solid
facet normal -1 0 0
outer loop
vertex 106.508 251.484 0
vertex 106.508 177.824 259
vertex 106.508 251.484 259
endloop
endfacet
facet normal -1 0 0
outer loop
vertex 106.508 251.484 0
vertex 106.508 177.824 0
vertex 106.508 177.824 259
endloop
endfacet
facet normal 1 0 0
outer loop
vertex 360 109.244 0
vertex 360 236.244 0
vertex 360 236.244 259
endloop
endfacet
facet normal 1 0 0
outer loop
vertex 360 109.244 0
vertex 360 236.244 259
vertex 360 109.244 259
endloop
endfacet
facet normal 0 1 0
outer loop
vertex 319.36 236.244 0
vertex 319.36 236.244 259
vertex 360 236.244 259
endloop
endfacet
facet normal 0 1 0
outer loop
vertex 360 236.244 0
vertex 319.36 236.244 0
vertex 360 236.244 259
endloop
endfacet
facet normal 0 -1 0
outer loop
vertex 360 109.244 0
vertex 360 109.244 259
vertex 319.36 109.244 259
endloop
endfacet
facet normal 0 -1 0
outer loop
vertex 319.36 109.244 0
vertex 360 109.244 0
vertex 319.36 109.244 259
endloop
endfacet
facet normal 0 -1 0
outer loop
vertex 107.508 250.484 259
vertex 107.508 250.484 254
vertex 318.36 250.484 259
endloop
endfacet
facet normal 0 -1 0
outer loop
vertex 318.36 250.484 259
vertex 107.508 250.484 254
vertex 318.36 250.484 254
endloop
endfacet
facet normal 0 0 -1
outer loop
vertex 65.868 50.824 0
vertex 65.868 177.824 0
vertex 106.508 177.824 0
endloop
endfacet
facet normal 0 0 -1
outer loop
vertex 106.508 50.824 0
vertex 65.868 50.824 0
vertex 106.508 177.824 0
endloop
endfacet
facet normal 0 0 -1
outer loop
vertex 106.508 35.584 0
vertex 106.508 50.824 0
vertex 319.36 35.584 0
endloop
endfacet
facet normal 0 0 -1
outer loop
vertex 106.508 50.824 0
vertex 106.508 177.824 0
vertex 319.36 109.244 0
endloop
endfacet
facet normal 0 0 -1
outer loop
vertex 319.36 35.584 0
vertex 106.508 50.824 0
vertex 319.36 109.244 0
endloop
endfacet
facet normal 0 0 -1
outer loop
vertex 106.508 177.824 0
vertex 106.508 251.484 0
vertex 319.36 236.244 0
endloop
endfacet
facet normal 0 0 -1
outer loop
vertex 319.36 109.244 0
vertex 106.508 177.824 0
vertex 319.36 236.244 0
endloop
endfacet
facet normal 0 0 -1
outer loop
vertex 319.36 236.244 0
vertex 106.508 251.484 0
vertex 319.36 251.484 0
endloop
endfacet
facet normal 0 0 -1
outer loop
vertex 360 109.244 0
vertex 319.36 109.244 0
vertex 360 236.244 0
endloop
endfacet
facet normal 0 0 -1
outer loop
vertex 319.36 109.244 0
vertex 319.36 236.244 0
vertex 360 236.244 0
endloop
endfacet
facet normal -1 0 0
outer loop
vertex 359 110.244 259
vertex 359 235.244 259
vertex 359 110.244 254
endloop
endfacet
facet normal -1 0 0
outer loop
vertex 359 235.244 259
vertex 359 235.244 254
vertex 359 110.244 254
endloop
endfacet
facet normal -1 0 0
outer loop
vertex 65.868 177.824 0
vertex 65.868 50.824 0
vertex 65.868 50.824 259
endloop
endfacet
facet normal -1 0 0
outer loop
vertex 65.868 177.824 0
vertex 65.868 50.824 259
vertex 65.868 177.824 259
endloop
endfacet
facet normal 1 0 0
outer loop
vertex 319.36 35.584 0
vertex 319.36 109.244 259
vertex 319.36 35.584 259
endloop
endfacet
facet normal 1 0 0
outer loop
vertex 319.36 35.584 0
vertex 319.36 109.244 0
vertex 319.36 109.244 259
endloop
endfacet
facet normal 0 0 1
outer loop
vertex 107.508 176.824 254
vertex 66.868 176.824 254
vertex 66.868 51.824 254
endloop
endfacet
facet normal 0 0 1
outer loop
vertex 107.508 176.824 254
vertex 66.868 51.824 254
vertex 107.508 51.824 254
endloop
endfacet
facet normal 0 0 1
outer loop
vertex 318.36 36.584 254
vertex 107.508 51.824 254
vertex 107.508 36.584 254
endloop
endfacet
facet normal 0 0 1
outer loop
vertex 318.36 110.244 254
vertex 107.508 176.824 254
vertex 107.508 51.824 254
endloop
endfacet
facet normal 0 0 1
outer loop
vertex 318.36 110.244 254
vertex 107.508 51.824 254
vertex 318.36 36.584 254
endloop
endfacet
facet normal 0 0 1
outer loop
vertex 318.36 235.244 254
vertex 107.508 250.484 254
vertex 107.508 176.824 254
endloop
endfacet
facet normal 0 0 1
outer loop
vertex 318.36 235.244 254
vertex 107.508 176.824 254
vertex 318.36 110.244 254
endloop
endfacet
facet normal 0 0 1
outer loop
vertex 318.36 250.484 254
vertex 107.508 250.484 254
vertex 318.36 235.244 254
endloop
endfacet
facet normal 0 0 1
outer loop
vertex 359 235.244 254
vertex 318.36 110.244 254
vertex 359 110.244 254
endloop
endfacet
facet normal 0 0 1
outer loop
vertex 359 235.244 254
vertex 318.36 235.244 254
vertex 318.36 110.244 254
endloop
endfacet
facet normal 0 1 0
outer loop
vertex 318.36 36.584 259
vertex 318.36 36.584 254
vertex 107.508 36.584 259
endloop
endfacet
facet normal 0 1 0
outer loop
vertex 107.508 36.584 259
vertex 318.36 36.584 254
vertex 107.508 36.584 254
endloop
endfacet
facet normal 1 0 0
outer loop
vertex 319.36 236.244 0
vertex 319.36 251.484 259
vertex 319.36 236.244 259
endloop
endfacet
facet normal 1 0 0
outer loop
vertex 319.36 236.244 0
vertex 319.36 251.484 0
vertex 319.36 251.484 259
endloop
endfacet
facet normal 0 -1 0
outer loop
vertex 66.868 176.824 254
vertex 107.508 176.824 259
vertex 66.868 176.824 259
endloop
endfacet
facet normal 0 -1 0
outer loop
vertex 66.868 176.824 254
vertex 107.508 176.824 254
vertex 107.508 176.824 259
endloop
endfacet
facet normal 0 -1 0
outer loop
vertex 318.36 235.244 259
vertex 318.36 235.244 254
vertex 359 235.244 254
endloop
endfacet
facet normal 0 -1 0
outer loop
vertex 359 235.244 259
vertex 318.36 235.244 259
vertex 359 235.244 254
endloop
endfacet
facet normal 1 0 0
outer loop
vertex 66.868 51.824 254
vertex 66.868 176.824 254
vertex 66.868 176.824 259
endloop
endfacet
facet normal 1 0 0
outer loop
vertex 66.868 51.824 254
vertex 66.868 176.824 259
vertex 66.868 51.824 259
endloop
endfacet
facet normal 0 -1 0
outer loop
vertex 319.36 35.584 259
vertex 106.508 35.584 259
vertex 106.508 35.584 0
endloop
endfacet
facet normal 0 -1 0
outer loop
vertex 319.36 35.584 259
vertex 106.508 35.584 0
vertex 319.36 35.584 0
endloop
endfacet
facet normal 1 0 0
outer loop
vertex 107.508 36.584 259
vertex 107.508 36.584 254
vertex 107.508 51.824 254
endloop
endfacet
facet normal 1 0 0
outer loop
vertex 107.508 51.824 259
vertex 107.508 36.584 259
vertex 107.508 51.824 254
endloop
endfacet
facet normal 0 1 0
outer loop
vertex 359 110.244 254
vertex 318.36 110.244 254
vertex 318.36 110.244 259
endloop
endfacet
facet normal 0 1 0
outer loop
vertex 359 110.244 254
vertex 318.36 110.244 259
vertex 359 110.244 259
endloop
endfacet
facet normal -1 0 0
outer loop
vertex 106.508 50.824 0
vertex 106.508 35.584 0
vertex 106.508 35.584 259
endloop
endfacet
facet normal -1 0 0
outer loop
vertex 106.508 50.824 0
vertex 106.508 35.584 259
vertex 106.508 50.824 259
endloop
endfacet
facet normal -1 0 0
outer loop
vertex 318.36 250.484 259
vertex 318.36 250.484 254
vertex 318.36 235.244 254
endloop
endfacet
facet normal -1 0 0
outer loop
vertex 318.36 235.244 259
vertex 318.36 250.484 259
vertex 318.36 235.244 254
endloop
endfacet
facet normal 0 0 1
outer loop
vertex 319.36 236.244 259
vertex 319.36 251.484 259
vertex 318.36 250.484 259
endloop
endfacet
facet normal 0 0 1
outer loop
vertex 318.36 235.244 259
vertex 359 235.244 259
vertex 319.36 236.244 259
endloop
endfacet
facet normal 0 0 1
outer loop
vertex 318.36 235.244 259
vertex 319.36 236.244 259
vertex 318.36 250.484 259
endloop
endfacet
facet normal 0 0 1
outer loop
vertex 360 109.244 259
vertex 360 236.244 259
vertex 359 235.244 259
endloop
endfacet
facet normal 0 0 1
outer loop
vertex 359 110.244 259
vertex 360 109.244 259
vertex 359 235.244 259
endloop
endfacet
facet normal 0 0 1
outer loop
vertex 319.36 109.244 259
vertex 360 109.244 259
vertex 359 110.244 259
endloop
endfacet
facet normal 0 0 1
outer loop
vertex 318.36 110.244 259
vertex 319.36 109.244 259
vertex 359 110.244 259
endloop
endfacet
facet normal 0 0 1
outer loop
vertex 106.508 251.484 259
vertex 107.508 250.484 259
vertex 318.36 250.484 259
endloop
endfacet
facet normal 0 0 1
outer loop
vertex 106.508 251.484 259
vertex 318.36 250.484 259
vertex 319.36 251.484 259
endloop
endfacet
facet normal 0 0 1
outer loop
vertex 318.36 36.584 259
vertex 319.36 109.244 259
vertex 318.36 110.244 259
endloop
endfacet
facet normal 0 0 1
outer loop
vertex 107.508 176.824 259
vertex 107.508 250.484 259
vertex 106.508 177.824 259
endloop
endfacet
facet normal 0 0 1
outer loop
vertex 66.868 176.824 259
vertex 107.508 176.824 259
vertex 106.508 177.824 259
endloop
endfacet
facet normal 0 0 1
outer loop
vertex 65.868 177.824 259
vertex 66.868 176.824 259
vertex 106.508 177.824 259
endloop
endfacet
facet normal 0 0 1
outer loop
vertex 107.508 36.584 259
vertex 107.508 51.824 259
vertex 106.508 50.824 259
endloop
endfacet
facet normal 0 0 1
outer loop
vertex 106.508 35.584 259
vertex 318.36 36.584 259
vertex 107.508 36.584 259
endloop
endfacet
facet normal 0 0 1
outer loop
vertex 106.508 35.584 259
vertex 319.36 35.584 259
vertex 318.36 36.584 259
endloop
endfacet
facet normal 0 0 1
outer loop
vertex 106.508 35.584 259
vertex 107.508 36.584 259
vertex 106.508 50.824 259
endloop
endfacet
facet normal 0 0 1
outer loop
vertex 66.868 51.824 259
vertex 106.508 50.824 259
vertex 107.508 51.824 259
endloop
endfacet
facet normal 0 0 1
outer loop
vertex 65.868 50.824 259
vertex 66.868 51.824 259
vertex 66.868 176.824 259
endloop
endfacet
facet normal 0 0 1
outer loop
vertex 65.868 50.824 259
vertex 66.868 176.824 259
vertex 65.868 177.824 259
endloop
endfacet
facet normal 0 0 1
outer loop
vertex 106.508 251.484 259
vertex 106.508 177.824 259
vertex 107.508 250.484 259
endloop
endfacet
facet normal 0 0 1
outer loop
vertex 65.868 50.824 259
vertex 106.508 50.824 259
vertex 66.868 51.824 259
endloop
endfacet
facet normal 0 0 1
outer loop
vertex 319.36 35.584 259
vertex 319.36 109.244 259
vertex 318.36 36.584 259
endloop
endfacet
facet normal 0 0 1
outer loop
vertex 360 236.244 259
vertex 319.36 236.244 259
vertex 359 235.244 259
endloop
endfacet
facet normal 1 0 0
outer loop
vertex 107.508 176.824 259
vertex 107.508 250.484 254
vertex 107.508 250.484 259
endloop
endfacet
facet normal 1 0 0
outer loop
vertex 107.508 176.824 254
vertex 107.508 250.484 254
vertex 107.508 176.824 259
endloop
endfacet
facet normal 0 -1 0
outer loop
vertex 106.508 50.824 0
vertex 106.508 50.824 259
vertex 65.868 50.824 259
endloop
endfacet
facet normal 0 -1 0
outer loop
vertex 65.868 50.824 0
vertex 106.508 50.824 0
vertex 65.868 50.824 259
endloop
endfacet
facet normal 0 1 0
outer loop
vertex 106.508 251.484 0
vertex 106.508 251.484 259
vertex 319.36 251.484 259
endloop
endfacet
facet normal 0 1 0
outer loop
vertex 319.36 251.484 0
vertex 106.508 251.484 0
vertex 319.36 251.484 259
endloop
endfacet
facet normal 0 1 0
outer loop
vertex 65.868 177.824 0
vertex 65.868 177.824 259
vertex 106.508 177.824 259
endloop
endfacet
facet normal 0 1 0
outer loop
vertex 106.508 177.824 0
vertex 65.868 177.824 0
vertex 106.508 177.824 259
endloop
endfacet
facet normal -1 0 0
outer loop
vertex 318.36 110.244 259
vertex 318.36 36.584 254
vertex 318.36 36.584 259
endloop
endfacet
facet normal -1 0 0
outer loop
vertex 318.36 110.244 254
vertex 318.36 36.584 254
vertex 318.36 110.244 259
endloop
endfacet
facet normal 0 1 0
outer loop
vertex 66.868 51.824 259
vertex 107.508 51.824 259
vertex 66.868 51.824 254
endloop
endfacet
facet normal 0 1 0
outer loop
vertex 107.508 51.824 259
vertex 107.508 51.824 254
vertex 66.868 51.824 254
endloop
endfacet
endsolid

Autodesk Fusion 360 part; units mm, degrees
sketch "Sketch1" plane through (0, 0, 0) normal (0, 0, 1) x (1, 0, 0)
sketch "Sketch2" plane through (0, 0, 0) normal (0, 0, 1) x (1, 0, 0)
  line L0 (106.508, 35.5843) -> (319.36, 35.5843)
  line L1 (106.508, 35.5843) -> (106.508, 50.8243)
  line L2 (106.508, 50.8243) -> (65.868, 50.8243)
  line L3 (65.868, 50.8243) -> (65.868, 177.8243)
  line L4 (65.868, 177.8243) -> (106.508, 177.8243)
  line L5 (106.508, 177.8243) -> (106.508, 251.4843)
  line L6 (106.508, 251.4843) -> (319.36, 251.4843)
  line L7 (319.36, 251.4843) -> (319.36, 236.2443)
  line L8 (319.36, 236.2443) -> (360, 236.2443)
  line L9 (360, 236.2443) -> (360, 109.2443)
  line L10 (360, 109.2443) -> (319.36, 109.2443)
  line L11 (319.36, 109.2443) -> (319.36, 35.5843)
  dimension "d2" = 212.852
  dimension "d3" = 15.24
  dimension "d4" = 40.64
  dimension "d5" = 127
  dimension "d6" = 40.64
  dimension "d7" = 73.66
  dimension "d8" = 212.852
  dimension "d9" = 15.24
  dimension "d10" = 40.64
  dimension "d11" = 73.66
extrude "Extrude1" add sketch "Sketch2" along normal blind 254
sketch "Sketch3" plane through (0, 0, 254) normal (0, 0, 1) x (-1, 0, 0)
  line L0 (-106.508, -35.5843) -> (-319.36, -35.5843)
  line L1 (-319.36, -35.5843) -> (-319.36, -109.2443)
  line L2 (-319.36, -109.2443) -> (-360, -109.2443)
  line L3 (-360, -109.2443) -> (-360, -236.2443)
  line L4 (-360, -236.2443) -> (-319.36, -236.2443)
  line L5 (-319.36, -236.2443) -> (-319.36, -251.4843)
  line L6 (-319.36, -251.4843) -> (-106.508, -251.4843)
  line L7 (-106.508, -251.4843) -> (-106.508, -177.8243)
  line L8 (-106.508, -177.8243) -> (-65.868, -177.8243)
  line L9 (-65.868, -177.8243) -> (-65.868, -50.8243)
  line L10 (-65.868, -50.8243) -> (-106.508, -50.8243)
  line L11 (-106.508, -50.8243) -> (-106.508, -35.5843)
  line L12 (-65.868, -177.8243) -> (-66.868, -177.8243)
  line L13 (-66.868, -177.8243) -> (-66.868, -50.8243)
  line L14 (-66.868, -50.8243) -> (-65.868, -50.8243)
  line L15 (-65.868, -50.8243) -> (-65.868, -177.8243)
  line L16 (-65.868, -177.8243) -> (-107.508, -177.8243)
  line L17 (-107.508, -177.8243) -> (-107.508, -176.8243)
  line L18 (-107.508, -176.8243) -> (-65.868, -176.8243)
  line L19 (-65.868, -176.8243) -> (-65.868, -177.8243)
  line L20 (-65.868, -50.8243) -> (-107.508, -50.8243)
  line L21 (-107.508, -50.8243) -> (-107.508, -51.8243)
  line L22 (-107.508, -51.8243) -> (-65.868, -51.8243)
  line L23 (-65.868, -51.8243) -> (-65.868, -50.8243)
  line L24 (-107.508, -51.8243) -> (-106.508, -51.8243)
  line L25 (-106.508, -51.8243) -> (-106.508, -35.5843)
  line L26 (-106.508, -35.5843) -> (-107.508, -35.5843)
  line L27 (-107.508, -35.5843) -> (-107.508, -51.8243)
  line L28 (-106.508, -35.5843) -> (-319.36, -35.5843)
  line L29 (-319.36, -35.5843) -> (-319.36, -36.5843)
  line L30 (-319.36, -36.5843) -> (-106.508, -36.5843)
  line L31 (-106.508, -36.5843) -> (-106.508, -35.5843)
  line L32 (-319.36, -35.5843) -> (-318.36, -35.5843)
  line L33 (-318.36, -35.5843) -> (-318.36, -110.2443)
  line L34 (-318.36, -110.2443) -> (-319.36, -110.2443)
  line L35 (-319.36, -110.2443) -> (-319.36, -35.5843)
  line L36 (-318.36, -110.2443) -> (-360, -110.2443)
  line L37 (-360, -110.2443) -> (-360, -109.2443)
  line L38 (-360, -109.2443) -> (-318.36, -109.2443)
  line L39 (-318.36, -109.2443) -> (-318.36, -110.2443)
  line L40 (-360, -236.2443) -> (-359, -236.2443)
  line L41 (-359, -236.2443) -> (-359, -109.2443)
  line L42 (-359, -109.2443) -> (-360, -109.2443)
  line L43 (-360, -109.2443) -> (-360, -236.2443)
  line L44 (-360, -236.2443) -> (-318.36, -236.2443)
  line L45 (-318.36, -236.2443) -> (-318.36, -235.2443)
  line L46 (-318.36, -235.2443) -> (-360, -235.2443)
  line L47 (-360, -235.2443) -> (-360, -236.2443)
  line L48 (-319.36, -251.4843) -> (-318.36, -251.4843)
  line L49 (-318.36, -251.4843) -> (-318.36, -235.2443)
  line L50 (-318.36, -235.2443) -> (-319.36, -235.2443)
  line L51 (-319.36, -235.2443) -> (-319.36, -251.4843)
  line L52 (-319.36, -251.4843) -> (-106.508, -251.4843)
  line L53 (-106.508, -251.4843) -> (-106.508, -250.4843)
  line L54 (-106.508, -250.4843) -> (-319.36, -250.4843)
  line L55 (-319.36, -250.4843) -> (-319.36, -251.4843)
  line L56 (-107.508, -176.8243) -> (-106.508, -176.8243)
  line L57 (-106.508, -176.8243) -> (-106.508, -251.4843)
  line L58 (-106.508, -251.4843) -> (-107.508, -251.4843)
  line L59 (-107.508, -251.4843) -> (-107.508, -176.8243)
  dimension "d14" = 1
  dimension "d15" = 1
  dimension "d16" = 1
  dimension "d17" = 1
  dimension "d18" = 1
  dimension "d19" = 1
  dimension "d20" = 1
  dimension "d21" = 1
  dimension "d22" = 1
  dimension "d23" = 1
  dimension "d24" = 1
  dimension "d25" = 1
extrude "Extrude2" add sketch "Sketch3" along normal blind 5 contours L0 L11 L25 L26 L27 L28 L30 L31 | L0 L27 L28 L30 L33 | L11 L20 L25 L27 L30 | L0 L1 L28 L29 L30 L32 L33 L35 | L20 L21 L22 L24 L25 L27 | L10 L13 L20 L22 L25 | L1 L30 L33 L35 L38 | L9 L10 L13 L14 L15 L20 L22 L23 | L33 L34 L35 L36 L38 L39 | L9 L13 L15 L18 L22 | L2 L35 L36 L38 L41 | L8 L9 L12 L13 L15 L16 L18 L19 | L8 L13 L16 L18 L57 | L2 L3 L36 L37 L38 L41 L42 L43 | L16 L17 L18 L56 L57 L59 | L3 L36 L41 L43 L46 | L7 L16 L54 L57 L59 | L4 L41 L44 L46 L51 | L3 L4 L40 L41 L43 L44 L46 L47 | L6 L7 L52 L53 L54 L57 L58 L59 | L44 L45 L46 L49 L50 L51 | L6 L49 L52 L54 L59 | L5 L44 L49 L51 L54 | L5 L6 L48 L49 L51 L52 L54 L55
sketch "Sketch4" plane through (0, 0, 254) normal (0, 0, 1) x (-1, 0, 0)
  line L0 (-107.508, -176.8243) -> (-66.868, -176.8243)
  line L1 (-66.868, -176.8243) -> (-66.868, -51.8243)
  line L2 (-66.868, -51.8243) -> (-107.508, -51.8243)
  line L3 (-107.508, -51.8243) -> (-107.508, -36.5843)
  line L4 (-107.508, -36.5843) -> (-318.36, -36.5843)
  line L5 (-318.36, -36.5843) -> (-318.36, -110.2443)
  line L6 (-318.36, -110.2443) -> (-359, -110.2443)
  line L7 (-359, -110.2443) -> (-359, -235.2443)
  line L8 (-359, -235.2443) -> (-318.36, -235.2443)
  line L9 (-318.36, -235.2443) -> (-318.36, -250.4843)
  line L10 (-318.36, -250.4843) -> (-107.508, -250.4843)
  line L11 (-107.508, -250.4843) -> (-107.508, -176.8243)
  line L12 (-192.7092, -113.2958) -> (-177.8821, -135.8603)
  line L13 (-177.8821, -135.8603) -> (-181.5924, -155.5132)
  line L14 (-181.5924, -155.5132) -> (-189.7272, -162.9176)
  line L15 (-189.7272, -162.9176) -> (-197.3239, -162.6933)
  line L16 (-197.3239, -162.6933) -> (-208.6768, -121.2191)
  line L17 (-208.6768, -121.2191) -> (-209.0766, -103.7236)
  line L18 (-209.0766, -103.7236) -> (-206.2382, -88.6892)
  dimension "d40" = 27
  dimension "d42" = 11
  dimension "d44" = 43
  dimension "d46" = 17.5
  dimension "d47" = 7.6
  dimension "d48" = 107
  dimension "d49" = 166
  dimension "d50" = 20
  dimension "d51" = 136
  dimension "d52" = 143
  dimension "d54" = 15.3
  dimension "d55" = 168
